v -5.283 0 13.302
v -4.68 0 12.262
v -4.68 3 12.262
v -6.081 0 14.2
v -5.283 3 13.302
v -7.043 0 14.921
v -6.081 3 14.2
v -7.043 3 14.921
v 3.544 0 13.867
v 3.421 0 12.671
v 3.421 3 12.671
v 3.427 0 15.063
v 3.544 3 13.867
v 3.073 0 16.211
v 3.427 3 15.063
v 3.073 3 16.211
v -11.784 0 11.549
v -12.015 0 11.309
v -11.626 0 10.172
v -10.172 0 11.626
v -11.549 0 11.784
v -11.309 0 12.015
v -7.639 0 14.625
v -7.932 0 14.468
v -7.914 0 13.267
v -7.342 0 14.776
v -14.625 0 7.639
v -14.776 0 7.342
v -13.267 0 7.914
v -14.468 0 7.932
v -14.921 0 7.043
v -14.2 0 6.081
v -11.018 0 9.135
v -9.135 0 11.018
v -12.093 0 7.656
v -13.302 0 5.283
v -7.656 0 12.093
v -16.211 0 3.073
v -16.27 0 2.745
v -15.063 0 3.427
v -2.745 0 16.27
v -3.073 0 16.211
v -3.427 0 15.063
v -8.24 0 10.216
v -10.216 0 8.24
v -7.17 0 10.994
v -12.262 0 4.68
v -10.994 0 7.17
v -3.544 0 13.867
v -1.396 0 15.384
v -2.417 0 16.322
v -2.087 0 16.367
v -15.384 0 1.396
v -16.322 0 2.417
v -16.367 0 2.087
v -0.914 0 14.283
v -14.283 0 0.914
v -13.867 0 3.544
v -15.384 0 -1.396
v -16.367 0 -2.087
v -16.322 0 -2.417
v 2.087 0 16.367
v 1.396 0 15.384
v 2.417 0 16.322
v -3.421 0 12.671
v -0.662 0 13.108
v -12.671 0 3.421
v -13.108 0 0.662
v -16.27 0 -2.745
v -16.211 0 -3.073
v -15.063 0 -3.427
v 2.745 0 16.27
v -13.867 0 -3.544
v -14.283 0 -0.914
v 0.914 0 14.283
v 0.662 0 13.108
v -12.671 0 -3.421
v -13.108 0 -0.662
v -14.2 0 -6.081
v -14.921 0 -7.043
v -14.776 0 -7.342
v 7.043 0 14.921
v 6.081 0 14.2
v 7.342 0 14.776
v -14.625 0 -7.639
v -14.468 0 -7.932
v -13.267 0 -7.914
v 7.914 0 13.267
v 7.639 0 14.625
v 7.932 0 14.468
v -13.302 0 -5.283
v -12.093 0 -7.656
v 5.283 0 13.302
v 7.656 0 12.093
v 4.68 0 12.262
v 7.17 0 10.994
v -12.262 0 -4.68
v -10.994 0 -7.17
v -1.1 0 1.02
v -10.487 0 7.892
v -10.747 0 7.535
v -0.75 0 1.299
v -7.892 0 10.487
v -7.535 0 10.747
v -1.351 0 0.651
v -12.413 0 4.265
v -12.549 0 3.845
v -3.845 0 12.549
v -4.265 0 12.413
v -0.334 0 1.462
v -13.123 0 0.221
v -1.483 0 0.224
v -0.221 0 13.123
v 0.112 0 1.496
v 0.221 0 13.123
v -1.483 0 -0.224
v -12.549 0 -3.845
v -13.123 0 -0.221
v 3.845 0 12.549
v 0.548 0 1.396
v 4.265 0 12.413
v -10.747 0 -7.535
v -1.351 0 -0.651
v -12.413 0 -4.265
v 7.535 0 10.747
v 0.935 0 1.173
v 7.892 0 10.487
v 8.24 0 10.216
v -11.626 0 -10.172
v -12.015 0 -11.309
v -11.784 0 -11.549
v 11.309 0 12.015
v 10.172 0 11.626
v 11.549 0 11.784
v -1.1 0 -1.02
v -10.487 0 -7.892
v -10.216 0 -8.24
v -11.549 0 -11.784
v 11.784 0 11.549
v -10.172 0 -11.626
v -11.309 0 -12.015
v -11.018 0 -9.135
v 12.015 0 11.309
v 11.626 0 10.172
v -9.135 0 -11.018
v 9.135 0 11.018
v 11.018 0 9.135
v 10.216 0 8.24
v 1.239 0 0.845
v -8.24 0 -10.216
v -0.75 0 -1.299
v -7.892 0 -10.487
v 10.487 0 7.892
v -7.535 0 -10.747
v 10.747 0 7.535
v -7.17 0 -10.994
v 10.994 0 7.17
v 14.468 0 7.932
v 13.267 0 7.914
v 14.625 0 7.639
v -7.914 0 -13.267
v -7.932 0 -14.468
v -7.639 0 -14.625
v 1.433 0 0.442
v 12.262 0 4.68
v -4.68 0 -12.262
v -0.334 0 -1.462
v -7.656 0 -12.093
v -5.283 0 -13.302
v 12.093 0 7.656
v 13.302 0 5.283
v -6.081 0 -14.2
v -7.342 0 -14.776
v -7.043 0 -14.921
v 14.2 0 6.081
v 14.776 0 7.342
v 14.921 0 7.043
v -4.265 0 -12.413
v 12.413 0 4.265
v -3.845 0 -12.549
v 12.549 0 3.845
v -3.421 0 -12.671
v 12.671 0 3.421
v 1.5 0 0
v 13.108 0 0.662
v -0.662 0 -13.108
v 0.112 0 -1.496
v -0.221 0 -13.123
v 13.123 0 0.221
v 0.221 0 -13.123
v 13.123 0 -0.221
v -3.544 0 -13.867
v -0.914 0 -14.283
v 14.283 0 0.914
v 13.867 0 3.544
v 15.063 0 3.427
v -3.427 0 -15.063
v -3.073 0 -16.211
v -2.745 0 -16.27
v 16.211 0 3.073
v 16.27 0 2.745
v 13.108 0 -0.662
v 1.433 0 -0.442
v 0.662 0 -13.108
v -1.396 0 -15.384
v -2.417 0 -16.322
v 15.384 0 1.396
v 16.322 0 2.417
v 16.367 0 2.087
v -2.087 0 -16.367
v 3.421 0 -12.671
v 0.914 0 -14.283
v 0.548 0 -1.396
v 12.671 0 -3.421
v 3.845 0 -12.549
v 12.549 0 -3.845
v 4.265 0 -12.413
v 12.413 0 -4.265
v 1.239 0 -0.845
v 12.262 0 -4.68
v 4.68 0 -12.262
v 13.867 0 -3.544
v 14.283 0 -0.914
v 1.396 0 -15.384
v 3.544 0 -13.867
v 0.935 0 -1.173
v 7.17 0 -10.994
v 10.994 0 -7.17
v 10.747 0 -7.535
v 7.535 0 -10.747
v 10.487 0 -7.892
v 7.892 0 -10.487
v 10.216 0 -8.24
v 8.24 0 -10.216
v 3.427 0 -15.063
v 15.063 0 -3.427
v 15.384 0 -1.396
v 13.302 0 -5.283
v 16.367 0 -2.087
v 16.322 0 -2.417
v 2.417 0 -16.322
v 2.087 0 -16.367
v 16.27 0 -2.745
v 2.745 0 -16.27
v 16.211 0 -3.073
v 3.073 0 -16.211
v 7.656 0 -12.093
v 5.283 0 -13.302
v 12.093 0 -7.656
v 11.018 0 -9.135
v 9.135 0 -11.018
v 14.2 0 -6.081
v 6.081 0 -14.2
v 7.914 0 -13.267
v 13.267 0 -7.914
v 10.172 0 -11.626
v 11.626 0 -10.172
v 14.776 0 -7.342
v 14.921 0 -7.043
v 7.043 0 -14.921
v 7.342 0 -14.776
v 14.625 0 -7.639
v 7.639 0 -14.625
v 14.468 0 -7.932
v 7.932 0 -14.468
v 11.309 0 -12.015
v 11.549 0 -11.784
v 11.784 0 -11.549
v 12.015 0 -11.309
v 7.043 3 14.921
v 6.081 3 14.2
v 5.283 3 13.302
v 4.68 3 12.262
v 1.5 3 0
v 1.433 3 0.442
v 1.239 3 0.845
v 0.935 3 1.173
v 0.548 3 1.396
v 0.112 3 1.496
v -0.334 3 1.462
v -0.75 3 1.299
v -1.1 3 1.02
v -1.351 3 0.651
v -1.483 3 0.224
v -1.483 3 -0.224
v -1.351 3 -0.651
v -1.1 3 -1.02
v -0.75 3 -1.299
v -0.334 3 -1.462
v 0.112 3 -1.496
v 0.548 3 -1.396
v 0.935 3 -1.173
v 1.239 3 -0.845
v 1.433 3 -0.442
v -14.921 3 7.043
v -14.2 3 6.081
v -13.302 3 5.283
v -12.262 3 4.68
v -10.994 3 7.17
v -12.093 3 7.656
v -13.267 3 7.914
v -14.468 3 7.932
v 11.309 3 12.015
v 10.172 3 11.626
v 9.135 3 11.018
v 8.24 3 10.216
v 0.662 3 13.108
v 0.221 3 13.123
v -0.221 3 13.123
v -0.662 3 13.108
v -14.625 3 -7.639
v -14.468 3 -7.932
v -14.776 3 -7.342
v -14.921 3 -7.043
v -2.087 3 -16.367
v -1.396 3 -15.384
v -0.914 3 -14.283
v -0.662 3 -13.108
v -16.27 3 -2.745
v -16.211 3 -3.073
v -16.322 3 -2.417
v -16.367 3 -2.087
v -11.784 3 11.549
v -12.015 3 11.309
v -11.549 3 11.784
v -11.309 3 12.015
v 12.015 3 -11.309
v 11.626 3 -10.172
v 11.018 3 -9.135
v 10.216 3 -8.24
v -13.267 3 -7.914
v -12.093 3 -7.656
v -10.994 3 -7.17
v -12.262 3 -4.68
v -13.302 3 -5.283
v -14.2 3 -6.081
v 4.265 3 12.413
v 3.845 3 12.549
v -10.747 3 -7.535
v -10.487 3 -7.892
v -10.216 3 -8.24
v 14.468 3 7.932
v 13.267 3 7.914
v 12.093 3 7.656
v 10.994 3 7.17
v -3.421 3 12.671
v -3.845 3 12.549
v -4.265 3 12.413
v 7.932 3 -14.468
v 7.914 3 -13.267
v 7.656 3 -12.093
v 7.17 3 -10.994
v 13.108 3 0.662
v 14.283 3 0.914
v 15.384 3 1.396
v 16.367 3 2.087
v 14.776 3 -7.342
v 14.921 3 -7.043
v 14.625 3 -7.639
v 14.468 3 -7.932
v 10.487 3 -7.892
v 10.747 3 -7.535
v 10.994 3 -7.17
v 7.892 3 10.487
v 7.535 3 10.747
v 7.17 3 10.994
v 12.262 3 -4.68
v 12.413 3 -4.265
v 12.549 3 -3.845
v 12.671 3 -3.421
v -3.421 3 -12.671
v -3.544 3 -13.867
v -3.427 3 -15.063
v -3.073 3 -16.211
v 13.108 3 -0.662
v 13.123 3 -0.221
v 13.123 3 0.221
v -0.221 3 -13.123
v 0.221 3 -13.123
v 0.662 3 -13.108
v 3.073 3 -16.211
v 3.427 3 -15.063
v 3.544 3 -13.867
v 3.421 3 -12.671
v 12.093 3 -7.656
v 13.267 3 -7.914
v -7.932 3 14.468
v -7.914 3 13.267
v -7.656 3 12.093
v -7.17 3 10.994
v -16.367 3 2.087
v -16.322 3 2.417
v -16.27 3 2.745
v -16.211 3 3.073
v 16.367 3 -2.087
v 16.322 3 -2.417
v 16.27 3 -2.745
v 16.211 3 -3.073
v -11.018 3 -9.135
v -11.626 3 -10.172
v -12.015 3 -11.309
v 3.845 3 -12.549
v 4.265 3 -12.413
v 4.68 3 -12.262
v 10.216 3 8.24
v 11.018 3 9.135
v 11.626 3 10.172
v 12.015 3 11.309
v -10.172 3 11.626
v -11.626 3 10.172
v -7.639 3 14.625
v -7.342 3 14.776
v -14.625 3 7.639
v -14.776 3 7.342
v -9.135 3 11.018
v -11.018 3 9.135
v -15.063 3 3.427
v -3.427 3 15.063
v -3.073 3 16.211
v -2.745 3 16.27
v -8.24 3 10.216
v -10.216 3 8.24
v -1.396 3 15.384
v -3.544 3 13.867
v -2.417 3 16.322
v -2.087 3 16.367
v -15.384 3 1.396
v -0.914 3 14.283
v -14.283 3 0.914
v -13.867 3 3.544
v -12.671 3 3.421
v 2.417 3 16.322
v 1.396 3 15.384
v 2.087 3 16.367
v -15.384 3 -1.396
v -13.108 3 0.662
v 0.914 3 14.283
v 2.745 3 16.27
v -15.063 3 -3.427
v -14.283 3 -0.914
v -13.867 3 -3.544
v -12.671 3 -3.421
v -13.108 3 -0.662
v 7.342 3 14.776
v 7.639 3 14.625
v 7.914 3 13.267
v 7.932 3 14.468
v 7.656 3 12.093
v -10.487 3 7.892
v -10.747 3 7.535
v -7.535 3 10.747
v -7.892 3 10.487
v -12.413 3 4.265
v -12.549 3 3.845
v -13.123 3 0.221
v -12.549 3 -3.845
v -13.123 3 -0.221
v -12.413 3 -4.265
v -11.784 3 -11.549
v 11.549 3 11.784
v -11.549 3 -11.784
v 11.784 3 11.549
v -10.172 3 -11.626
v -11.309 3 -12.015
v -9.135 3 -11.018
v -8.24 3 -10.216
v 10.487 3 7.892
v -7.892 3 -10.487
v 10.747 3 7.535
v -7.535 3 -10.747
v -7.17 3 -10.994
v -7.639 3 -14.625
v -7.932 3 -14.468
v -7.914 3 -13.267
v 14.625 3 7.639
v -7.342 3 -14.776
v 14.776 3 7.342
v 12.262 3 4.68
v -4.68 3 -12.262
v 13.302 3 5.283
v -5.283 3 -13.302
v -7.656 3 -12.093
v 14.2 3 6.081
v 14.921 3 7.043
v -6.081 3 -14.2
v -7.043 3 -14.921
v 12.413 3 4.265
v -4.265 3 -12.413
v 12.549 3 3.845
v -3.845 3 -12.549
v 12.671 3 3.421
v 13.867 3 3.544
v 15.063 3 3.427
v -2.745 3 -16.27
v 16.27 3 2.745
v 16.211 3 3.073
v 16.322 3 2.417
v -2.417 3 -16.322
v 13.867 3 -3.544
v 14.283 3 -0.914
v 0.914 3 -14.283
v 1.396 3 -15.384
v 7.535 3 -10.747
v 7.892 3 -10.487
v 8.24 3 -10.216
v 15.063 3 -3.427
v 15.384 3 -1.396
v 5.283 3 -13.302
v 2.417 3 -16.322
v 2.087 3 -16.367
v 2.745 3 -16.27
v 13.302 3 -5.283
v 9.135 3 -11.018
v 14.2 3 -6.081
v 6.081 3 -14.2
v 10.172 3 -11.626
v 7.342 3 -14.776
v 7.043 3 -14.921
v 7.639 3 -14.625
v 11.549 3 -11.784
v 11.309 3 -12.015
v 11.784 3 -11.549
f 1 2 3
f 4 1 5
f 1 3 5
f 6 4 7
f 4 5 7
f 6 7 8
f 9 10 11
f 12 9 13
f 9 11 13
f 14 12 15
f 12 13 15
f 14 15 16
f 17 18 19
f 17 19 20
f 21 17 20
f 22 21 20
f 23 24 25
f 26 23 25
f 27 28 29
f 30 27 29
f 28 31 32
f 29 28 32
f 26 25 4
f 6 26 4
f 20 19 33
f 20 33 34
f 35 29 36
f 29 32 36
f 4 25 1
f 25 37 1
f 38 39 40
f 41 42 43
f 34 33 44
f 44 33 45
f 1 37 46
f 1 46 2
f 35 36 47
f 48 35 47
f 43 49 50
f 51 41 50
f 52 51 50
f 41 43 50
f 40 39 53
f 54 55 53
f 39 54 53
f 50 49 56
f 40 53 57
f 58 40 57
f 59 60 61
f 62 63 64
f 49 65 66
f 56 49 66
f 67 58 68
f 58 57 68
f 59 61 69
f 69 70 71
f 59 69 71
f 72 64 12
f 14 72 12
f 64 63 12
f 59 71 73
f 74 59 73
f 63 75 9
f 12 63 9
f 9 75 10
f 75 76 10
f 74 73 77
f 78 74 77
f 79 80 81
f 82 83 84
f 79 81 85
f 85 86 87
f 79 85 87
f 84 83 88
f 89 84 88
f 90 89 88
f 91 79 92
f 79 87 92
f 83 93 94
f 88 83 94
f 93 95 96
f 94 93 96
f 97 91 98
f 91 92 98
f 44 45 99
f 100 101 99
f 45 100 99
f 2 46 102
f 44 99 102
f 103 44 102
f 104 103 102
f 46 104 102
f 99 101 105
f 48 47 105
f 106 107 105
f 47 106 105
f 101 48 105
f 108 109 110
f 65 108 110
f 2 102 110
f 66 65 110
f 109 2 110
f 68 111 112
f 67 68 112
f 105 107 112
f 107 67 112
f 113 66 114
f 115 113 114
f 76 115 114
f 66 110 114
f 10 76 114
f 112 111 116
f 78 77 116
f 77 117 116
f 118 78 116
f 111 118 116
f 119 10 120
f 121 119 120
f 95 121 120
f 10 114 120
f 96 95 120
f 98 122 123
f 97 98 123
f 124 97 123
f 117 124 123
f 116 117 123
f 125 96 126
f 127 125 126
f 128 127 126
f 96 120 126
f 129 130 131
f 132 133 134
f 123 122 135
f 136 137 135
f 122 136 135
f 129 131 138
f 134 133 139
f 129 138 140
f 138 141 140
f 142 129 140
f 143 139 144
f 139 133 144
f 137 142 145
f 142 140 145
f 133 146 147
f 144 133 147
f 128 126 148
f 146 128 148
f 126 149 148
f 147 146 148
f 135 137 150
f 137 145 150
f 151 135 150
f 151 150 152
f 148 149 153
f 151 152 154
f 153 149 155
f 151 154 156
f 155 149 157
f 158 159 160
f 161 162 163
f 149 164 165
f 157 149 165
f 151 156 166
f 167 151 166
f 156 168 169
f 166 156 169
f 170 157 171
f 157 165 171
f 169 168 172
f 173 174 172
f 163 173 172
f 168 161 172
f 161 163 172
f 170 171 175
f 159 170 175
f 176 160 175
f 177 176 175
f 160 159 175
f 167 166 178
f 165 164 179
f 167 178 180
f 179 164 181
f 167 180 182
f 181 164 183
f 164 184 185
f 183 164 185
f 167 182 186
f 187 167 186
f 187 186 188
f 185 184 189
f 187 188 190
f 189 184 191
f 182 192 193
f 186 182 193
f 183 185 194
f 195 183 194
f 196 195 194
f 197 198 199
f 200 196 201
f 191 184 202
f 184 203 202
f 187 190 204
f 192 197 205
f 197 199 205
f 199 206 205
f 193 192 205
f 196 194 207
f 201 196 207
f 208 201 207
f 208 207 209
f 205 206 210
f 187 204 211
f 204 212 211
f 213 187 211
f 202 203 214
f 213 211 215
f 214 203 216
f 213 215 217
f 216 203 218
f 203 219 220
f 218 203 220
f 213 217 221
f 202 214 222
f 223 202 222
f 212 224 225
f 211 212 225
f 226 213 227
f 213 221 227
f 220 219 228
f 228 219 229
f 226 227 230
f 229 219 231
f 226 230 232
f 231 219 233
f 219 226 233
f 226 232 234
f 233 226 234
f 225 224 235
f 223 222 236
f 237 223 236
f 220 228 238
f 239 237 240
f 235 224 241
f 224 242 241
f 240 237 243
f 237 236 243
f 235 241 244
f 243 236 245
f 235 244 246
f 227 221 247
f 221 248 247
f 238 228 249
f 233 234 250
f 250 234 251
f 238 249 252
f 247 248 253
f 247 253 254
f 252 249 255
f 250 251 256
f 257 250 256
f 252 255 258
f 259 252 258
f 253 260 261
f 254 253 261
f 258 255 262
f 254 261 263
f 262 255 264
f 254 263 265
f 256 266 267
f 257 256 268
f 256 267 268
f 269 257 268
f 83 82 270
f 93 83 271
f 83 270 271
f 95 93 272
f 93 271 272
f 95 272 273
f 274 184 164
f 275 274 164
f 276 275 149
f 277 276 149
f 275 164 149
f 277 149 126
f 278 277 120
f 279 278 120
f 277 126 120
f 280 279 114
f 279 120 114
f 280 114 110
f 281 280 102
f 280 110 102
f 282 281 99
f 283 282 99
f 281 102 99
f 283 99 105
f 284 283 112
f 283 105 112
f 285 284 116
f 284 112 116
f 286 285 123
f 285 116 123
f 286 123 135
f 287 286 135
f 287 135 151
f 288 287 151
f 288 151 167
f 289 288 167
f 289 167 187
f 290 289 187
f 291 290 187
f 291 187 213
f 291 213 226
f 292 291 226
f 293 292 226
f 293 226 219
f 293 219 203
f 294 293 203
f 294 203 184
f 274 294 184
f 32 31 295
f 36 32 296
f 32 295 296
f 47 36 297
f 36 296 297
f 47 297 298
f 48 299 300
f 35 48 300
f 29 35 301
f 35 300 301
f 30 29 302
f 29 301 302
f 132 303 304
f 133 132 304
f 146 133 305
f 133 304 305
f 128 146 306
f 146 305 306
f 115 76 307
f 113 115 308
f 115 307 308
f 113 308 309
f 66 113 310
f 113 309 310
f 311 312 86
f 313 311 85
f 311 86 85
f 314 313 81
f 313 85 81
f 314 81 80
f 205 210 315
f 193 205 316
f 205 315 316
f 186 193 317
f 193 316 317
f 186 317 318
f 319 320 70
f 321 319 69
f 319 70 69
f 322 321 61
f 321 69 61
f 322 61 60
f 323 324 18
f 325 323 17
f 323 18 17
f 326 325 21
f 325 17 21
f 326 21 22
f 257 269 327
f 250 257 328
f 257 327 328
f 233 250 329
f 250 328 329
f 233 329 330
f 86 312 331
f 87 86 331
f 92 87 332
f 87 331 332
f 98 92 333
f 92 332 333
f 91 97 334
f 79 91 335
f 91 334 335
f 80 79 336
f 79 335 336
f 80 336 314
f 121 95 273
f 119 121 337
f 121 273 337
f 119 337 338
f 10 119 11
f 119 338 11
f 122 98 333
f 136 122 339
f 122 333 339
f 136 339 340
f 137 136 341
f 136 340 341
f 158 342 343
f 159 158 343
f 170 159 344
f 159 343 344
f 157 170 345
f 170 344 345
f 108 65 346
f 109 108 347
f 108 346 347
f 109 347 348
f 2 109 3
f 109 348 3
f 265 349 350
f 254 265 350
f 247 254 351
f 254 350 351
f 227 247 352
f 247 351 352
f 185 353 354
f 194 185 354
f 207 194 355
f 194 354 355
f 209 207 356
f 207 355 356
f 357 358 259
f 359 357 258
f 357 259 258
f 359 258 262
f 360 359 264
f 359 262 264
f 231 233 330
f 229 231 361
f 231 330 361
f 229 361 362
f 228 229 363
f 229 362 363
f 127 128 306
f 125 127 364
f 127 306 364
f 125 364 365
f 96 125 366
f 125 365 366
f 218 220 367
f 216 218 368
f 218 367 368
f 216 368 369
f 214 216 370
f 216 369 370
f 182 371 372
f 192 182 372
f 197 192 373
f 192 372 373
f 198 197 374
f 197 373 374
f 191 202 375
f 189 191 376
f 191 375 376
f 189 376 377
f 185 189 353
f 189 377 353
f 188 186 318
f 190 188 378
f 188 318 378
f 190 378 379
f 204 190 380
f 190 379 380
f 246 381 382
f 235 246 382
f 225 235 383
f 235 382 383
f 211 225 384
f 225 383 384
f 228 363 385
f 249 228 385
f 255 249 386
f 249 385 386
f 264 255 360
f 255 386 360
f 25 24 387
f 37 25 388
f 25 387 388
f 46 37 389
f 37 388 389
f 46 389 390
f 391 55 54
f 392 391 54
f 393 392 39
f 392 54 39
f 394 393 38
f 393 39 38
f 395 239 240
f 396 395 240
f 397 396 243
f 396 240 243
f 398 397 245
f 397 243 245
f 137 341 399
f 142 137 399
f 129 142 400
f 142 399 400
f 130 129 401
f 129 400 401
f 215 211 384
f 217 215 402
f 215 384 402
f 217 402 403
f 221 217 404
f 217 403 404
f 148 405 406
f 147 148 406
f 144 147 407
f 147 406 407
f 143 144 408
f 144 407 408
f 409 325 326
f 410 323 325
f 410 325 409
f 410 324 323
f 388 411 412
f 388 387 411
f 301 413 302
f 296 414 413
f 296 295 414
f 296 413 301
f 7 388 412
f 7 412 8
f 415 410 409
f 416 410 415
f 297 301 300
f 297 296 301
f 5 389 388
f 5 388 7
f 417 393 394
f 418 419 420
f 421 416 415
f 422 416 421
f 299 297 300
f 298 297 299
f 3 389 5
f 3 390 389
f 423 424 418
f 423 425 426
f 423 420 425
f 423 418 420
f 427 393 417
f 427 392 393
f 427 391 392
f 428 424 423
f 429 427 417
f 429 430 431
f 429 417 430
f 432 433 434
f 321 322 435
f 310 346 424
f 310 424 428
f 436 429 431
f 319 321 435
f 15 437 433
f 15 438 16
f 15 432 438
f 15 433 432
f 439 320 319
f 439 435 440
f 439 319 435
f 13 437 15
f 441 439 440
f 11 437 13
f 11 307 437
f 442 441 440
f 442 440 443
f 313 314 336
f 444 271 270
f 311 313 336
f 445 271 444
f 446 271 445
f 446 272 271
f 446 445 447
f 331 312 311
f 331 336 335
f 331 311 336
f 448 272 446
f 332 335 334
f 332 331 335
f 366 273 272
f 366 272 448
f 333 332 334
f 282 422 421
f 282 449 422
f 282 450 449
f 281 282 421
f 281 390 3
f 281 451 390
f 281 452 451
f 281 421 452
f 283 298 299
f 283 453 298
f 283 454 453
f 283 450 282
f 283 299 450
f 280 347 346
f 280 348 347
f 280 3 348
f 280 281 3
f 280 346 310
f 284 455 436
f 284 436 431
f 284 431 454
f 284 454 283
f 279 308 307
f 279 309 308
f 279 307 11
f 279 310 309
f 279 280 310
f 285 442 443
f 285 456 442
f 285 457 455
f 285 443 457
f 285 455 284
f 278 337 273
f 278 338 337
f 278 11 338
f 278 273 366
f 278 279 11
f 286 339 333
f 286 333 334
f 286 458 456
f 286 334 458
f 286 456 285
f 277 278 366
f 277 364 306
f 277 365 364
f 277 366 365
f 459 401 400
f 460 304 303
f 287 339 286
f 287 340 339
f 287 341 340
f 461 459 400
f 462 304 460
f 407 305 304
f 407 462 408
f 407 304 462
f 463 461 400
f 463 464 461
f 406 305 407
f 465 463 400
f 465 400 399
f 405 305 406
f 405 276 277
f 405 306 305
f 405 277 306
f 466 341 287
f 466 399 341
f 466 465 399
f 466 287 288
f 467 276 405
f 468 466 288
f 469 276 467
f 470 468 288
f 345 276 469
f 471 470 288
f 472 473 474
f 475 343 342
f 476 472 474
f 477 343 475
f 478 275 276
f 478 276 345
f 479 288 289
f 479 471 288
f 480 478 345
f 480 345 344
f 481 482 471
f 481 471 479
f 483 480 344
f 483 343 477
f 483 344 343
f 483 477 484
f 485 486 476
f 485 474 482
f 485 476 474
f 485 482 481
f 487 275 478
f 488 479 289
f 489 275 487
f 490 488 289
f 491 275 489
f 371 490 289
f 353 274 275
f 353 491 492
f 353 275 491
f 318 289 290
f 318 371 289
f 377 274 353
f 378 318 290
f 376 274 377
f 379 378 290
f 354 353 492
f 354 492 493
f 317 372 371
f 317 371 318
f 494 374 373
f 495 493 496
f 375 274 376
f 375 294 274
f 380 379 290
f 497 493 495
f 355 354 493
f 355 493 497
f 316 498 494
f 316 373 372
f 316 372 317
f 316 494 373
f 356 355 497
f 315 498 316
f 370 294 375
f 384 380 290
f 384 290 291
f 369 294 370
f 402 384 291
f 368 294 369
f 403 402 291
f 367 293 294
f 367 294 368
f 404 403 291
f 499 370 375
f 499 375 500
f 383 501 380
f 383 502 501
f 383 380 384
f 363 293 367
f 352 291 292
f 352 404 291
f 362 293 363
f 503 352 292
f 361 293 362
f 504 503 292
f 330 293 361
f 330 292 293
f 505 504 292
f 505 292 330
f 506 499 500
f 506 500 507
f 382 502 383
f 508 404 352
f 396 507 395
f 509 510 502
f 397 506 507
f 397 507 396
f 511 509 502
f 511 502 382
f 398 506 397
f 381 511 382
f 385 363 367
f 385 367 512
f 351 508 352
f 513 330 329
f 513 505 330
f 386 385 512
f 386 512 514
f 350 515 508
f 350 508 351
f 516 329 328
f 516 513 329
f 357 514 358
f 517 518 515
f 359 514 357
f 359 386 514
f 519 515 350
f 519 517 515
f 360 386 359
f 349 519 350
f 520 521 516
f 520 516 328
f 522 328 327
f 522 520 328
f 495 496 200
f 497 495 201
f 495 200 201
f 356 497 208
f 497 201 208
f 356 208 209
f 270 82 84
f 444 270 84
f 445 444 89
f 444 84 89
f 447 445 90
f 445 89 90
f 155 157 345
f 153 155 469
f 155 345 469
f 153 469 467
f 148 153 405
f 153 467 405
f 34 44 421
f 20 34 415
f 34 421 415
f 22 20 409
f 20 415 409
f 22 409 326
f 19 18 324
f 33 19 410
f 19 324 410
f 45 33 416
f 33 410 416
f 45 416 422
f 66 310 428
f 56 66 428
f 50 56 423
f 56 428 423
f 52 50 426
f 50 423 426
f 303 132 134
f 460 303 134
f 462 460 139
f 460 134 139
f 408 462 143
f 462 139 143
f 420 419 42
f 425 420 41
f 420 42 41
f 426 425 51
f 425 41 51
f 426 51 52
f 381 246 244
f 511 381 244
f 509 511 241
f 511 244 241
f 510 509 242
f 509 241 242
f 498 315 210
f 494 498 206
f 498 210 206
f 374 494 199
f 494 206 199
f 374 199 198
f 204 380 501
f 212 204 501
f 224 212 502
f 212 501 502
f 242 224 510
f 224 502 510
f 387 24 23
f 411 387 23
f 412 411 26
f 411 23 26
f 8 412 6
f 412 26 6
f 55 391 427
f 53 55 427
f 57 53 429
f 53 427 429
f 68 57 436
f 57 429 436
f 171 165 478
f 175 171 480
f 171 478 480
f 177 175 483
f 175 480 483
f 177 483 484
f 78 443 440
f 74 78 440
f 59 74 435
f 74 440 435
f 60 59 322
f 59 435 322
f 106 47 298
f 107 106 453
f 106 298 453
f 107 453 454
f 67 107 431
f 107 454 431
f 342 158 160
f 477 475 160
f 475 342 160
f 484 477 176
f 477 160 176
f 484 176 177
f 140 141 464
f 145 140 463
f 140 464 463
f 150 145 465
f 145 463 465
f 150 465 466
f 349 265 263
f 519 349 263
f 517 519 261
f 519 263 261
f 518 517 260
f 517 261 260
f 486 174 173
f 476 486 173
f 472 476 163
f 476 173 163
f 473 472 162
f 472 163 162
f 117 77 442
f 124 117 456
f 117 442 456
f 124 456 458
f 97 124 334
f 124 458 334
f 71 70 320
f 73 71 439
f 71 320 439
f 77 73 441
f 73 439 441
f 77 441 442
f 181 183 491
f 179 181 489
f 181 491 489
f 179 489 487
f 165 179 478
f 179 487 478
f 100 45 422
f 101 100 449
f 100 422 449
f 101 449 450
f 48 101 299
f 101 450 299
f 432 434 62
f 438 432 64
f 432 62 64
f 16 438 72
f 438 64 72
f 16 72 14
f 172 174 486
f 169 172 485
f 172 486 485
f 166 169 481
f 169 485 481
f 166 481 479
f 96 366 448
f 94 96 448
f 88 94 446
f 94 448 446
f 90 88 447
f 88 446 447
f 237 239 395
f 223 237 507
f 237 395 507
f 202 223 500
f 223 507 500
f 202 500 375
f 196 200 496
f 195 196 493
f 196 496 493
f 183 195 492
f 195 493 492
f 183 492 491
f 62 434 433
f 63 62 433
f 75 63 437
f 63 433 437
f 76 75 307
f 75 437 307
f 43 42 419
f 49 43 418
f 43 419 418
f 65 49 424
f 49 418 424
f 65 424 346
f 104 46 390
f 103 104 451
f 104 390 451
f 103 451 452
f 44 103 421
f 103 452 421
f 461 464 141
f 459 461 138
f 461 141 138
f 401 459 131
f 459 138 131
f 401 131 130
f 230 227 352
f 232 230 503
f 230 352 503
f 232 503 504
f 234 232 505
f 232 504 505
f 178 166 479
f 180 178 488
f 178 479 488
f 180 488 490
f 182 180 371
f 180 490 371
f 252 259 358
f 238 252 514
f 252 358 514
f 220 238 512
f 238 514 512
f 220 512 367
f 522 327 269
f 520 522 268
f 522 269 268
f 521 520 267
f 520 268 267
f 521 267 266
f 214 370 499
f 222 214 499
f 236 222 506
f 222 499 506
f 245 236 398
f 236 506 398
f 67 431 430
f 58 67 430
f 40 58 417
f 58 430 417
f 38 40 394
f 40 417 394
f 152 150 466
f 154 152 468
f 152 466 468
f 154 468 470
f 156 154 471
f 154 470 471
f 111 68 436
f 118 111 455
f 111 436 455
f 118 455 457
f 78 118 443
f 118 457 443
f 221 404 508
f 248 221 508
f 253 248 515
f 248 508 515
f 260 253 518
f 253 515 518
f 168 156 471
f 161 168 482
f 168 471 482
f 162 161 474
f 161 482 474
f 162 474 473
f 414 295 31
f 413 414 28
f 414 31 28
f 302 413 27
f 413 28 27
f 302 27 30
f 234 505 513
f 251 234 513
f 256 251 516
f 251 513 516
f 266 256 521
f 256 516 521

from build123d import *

# Parameters (mm, degrees)
SKETCH1_R           = 16.5
BOSS_EXTRUDE1_DEPTH = 3
CUT_EXTRUDE1_DEPTH  = 4
CIRPATTERN1_COUNT   = 20
SKETCH4_R           = 1.5
CUT_EXTRUDE3_DEPTH  = 10


with BuildPart() as part:
    # Sketch1 → Boss-Extrude1 (new body)
    with BuildSketch(Plane(origin=(0, 0, 0), x_dir=(1, 0, 0), z_dir=(0, 1, 0))):
        Circle(SKETCH1_R)
    extrude(amount=BOSS_EXTRUDE1_DEPTH)

    # Sketch2 → Cut-Extrude1 (cut, through all)
    with BuildSketch(Plane(origin=(0, 3, 0), x_dir=(1, 0, 0), z_dir=(0, 1, 0))):
        with BuildLine():
            ThreePointArc((-0.661599664, 13.108314571), (0, 13.125), (0.661599664, 13.108314571))
            ThreePointArc((0.661599664, 13.108314571), (1.127215597, 14.845961564), (2.087005275, 16.367480227))
            ThreePointArc((2.087005275, 16.367480227), (0, 16.5), (-2.087005275, 16.367480227))
            ThreePointArc((-2.087005275, 16.367480227), (-1.127215597, 14.845961564), (-0.661599664, 13.108314571))
        make_face()
    cut_extrude1 = extrude(amount=-CUT_EXTRUDE1_DEPTH, mode=Mode.SUBTRACT)

    # CirPattern1: Cut-Extrude1 ×20 about axis
    cirpattern1_axis = Axis((0, 0, 0), (0, 1, 0))
    for i in range(1, CIRPATTERN1_COUNT):
        add(cut_extrude1.rotate(cirpattern1_axis, i * 360 / CIRPATTERN1_COUNT), mode=Mode.SUBTRACT)

    # Sketch4 → Cut-Extrude3 (cut)
    with BuildSketch(Plane.XZ):
        Circle(SKETCH4_R)
    extrude(amount=-CUT_EXTRUDE3_DEPTH, mode=Mode.SUBTRACT)


solid = part.part
